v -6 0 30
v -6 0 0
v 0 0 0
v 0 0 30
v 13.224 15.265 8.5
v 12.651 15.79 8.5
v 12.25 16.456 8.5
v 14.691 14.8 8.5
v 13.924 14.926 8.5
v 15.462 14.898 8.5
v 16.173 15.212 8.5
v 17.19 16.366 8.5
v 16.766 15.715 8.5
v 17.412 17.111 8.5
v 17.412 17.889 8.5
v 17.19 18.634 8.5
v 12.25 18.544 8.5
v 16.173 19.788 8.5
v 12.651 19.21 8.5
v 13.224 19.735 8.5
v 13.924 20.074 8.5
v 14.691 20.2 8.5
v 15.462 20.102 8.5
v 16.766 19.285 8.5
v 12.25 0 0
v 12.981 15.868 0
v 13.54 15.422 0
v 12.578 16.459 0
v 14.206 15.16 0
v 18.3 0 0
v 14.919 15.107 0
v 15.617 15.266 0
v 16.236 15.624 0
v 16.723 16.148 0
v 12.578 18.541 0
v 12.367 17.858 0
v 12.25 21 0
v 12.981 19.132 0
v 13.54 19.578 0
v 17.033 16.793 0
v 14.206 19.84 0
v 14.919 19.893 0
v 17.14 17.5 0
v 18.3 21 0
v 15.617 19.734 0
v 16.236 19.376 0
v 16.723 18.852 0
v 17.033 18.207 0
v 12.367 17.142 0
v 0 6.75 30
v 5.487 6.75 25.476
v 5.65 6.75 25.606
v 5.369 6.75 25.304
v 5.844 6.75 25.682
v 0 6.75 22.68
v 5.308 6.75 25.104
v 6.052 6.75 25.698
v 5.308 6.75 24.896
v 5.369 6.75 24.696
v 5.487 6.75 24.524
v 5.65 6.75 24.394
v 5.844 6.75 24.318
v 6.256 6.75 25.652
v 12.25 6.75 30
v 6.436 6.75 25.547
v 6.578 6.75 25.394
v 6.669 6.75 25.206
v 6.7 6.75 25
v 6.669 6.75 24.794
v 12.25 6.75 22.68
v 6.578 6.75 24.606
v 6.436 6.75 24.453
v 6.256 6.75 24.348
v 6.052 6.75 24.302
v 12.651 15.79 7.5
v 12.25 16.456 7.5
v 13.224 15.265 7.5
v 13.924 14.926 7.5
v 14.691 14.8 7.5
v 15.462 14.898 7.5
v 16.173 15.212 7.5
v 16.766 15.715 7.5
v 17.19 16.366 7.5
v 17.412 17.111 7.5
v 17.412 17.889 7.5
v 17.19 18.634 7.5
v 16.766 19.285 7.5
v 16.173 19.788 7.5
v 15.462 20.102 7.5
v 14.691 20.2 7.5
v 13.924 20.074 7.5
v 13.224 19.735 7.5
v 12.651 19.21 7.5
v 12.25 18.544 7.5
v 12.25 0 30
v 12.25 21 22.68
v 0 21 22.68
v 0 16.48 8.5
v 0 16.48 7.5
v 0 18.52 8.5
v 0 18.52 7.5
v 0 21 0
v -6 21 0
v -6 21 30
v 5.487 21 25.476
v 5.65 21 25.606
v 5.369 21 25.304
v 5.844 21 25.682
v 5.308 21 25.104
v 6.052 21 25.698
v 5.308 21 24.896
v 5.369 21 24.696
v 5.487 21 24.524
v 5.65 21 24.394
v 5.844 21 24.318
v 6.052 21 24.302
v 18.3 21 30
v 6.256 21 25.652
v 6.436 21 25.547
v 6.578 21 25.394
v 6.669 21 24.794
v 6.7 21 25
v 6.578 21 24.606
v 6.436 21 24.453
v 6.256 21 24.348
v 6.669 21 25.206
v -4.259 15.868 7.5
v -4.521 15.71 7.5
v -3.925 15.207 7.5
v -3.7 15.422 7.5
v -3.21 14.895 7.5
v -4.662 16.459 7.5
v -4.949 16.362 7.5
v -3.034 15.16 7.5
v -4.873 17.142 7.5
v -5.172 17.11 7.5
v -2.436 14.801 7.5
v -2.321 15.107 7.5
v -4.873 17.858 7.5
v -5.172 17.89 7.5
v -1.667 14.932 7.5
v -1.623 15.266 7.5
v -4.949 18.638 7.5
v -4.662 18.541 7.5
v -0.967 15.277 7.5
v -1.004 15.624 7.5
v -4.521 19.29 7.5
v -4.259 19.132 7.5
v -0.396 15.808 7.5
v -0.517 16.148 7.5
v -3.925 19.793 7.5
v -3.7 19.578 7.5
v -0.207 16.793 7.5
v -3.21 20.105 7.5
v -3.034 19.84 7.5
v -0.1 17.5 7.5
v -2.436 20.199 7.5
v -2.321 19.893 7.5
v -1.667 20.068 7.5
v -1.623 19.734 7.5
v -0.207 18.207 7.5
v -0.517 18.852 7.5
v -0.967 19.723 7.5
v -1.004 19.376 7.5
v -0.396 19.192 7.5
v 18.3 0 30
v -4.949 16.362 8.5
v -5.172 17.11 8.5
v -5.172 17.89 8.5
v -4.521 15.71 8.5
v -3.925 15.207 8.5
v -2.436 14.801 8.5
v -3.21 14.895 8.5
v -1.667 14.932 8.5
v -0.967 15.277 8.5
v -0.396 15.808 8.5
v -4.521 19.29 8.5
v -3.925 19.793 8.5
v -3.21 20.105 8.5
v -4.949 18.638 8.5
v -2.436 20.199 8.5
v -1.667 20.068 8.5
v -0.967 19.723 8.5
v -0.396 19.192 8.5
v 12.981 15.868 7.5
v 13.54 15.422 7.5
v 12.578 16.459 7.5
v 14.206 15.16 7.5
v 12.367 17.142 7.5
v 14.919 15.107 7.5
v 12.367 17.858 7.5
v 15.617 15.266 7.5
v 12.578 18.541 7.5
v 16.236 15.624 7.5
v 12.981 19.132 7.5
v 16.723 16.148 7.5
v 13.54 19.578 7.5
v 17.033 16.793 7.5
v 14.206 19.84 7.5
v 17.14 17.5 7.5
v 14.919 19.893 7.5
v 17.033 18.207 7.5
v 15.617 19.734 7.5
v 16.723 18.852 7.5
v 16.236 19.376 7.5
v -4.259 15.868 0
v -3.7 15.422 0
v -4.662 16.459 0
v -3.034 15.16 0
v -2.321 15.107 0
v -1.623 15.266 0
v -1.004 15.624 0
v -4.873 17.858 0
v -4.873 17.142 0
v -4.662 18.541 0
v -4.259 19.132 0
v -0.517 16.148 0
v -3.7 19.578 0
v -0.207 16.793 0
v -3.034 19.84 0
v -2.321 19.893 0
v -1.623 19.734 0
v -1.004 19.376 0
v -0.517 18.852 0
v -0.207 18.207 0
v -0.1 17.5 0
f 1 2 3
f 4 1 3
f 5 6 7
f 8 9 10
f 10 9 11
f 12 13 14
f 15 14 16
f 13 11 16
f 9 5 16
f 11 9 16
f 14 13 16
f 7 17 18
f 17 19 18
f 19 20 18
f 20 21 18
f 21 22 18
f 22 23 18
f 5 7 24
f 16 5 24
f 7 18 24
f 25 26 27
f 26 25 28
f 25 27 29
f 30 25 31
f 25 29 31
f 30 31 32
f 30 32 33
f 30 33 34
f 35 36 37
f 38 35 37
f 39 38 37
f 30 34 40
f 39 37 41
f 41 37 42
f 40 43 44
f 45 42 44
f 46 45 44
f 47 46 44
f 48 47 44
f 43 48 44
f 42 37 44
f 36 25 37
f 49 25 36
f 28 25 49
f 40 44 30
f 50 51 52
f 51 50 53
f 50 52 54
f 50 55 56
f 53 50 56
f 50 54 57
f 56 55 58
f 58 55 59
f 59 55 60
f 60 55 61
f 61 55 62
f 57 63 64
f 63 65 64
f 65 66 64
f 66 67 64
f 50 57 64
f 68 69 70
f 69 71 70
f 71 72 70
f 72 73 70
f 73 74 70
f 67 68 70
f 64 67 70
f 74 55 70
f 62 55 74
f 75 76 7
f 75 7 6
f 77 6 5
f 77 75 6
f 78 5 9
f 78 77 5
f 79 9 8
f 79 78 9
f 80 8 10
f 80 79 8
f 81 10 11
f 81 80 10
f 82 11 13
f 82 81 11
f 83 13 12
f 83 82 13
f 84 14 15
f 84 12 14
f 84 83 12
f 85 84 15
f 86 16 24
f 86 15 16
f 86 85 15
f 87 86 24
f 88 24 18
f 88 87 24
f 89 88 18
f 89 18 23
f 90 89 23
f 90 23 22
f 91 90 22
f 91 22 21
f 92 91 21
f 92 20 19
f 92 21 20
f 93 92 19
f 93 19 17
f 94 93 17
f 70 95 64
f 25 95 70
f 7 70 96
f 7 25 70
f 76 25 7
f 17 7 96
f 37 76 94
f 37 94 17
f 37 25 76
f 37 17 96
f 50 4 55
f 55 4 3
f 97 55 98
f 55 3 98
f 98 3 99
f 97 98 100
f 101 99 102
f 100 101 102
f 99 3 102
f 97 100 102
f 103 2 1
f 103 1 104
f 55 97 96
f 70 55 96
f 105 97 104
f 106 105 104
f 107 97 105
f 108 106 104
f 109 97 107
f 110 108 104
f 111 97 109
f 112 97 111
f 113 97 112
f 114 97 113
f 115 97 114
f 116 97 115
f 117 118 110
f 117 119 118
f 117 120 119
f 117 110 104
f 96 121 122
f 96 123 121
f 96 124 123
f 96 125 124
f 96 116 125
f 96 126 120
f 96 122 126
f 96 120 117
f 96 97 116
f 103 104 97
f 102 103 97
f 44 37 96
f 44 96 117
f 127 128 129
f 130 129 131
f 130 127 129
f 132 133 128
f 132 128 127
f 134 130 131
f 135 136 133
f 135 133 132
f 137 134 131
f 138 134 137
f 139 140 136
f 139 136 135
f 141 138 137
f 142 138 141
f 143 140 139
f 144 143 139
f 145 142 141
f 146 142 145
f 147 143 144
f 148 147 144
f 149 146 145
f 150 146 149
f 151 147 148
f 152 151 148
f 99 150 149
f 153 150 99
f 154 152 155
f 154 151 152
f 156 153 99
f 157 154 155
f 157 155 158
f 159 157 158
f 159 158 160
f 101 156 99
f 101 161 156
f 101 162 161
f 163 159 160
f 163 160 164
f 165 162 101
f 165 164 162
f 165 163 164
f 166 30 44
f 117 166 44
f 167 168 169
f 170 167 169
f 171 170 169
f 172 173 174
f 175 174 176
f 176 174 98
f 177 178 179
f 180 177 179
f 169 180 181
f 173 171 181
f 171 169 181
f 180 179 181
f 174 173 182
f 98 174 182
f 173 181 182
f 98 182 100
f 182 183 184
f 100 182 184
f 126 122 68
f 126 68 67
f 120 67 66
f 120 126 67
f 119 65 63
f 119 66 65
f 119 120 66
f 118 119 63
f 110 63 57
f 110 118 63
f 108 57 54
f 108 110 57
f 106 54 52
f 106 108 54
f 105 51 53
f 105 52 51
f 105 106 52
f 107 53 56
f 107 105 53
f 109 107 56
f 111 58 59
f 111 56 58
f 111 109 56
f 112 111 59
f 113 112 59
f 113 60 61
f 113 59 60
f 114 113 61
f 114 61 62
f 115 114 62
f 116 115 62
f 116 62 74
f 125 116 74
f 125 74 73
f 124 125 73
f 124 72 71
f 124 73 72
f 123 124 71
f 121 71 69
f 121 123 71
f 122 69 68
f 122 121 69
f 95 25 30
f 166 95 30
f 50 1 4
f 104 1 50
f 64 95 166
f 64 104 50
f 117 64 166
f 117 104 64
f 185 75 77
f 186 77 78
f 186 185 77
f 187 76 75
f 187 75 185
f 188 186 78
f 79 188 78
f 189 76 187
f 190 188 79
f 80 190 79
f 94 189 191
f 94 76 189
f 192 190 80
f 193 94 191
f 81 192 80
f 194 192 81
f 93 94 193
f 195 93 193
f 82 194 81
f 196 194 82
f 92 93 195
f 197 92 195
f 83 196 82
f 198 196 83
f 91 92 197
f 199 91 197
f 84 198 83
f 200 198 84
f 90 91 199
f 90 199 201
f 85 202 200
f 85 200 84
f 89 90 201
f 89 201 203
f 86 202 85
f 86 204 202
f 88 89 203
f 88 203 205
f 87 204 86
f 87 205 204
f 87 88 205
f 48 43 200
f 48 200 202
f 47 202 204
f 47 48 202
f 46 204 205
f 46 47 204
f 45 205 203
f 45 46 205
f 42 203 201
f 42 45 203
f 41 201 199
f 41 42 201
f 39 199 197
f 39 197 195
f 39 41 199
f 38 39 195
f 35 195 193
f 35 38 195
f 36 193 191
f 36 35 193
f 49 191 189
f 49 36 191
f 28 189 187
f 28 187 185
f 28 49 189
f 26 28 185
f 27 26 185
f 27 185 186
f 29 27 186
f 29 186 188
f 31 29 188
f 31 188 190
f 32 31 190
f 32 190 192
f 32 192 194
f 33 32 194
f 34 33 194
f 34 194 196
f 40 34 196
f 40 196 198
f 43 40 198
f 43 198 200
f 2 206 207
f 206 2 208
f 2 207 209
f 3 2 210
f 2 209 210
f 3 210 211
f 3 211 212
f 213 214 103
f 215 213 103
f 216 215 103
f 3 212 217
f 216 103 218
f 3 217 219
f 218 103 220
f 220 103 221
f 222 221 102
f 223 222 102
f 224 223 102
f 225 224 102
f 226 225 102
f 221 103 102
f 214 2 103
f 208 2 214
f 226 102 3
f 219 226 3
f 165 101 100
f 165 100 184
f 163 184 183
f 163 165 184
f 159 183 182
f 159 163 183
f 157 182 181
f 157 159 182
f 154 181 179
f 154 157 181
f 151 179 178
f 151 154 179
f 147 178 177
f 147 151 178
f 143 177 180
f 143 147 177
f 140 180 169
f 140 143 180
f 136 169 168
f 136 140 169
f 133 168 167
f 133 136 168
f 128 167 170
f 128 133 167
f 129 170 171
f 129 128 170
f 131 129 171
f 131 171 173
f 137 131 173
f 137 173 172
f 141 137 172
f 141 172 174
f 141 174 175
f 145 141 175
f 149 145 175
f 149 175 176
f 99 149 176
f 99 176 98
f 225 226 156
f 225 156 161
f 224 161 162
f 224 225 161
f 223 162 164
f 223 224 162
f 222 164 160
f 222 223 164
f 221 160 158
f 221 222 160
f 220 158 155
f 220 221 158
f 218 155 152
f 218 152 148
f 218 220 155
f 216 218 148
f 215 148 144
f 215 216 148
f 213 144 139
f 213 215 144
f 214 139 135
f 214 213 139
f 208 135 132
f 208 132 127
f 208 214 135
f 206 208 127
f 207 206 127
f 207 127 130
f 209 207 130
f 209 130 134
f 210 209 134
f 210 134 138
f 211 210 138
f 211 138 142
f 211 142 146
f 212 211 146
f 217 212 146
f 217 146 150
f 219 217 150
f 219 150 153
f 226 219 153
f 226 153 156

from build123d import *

# Parameters (mm, degrees)
CYLINDER004_R     = 2.4
CYLINDER004_DEPTH = 13
CYLINDER005_R     = 2.7
CYLINDER005_DEPTH = 1
CYLINDER006_R     = 2.7
CYLINDER006_DEPTH = 1
CYLINDER003_R     = 2.4
CYLINDER003_DEPTH = 13
CYLINDER002_R     = 0.7
CYLINDER002_DEPTH = 16
BOX007_W          = 12.25
BOX007_H          = 10
BOX007_DEPTH      = 10
BOX003_W          = 12.25
BOX003_H          = 23.78
BOX003_DEPTH      = 22.68
BOX008_W          = 24.3
BOX008_H          = 21
BOX008_DEPTH      = 30


with BuildPart() as cylinder004:
    # Cylinder004 → Cylinder004 (new body)
    with BuildSketch(Plane(origin=(14.74, 17.5, -6.5), x_dir=(1, 0, 0), z_dir=(0, 0, 1))):
        Circle(CYLINDER004_R)
    extrude(amount=CYLINDER004_DEPTH)


with BuildPart() as cylinder005:
    # Cylinder005 → Cylinder005 (new body)
    with BuildSketch(Plane(origin=(-2.5, 17.5, 6.5), x_dir=(1, 0, 0), z_dir=(0, 0, 1))):
        Circle(CYLINDER005_R)
    extrude(amount=CYLINDER005_DEPTH)


with BuildPart() as cylinder006:
    # Cylinder006 → Cylinder006 (new body)
    with BuildSketch(Plane(origin=(14.74, 17.5, 6.5), x_dir=(1, 0, 0), z_dir=(0, 0, 1))):
        Circle(CYLINDER006_R)
    extrude(amount=CYLINDER006_DEPTH)


with BuildPart() as fusion004:
    # Cylinder003 → Cylinder003 (new body)
    with BuildSketch(Plane(origin=(-2.5, 17.5, -6.5), x_dir=(1, 0, 0), z_dir=(0, 0, 1))):
        Circle(CYLINDER003_R)
    extrude(amount=CYLINDER003_DEPTH)

    # Fusion004: union Cylinder004, Cylinder005, Cylinder006
    add(cylinder004.part)
    add(cylinder005.part)
    add(cylinder006.part)


with BuildPart() as fusion004_1:
    # Fusion004 placement: moved
    add(fusion004.part.moved(Location((0, 0, 1))))


with BuildPart() as cylinder002:
    # Cylinder002 → Cylinder002 (new body)
    with BuildSketch(Plane(origin=(6, 22, 25), x_dir=(1, 0, 0), z_dir=(0, -1, 0))):
        Circle(CYLINDER002_R)
    extrude(amount=CYLINDER002_DEPTH)


with BuildPart() as cube004:
    # Box007 → Box007 (new body)
    with BuildSketch(Plane(origin=(0, -3.25, 22), x_dir=(1, 0, 0), z_dir=(0, 0, 1))):
        with Locations((6.125, 5)):
            Rectangle(BOX007_W, BOX007_H)
    extrude(amount=BOX007_DEPTH)


with BuildPart() as servo002:
    # Box003 → Box003 (new body)
    with BuildSketch(Plane(origin=(0, -1, 0), x_dir=(1, 0, 0), z_dir=(0, 0, 1))):
        with Locations((6.125, 11.89)):
            Rectangle(BOX003_W, BOX003_H)
    extrude(amount=BOX003_DEPTH)

    # Fusion002: union Cube004
    add(cube004.part)


with BuildPart() as fusion003:
    # Fusion003 base: copy of Cube004
    add(cube004.part)

    # Fusion003: union servo002
    add(servo002.part)


with BuildPart() as cut004:
    # Box008 → Box008 (new body)
    with BuildSketch(Plane(origin=(-6, 0, 0), x_dir=(1, 0, 0), z_dir=(0, 0, 1))):
        with Locations((12.15, 10.5)):
            Rectangle(BOX008_W, BOX008_H)
    extrude(amount=BOX008_DEPTH)

    # Cut002: cut Fusion003
    add(fusion003.part, mode=Mode.SUBTRACT)

    # Cut003: cut Cylinder002
    add(cylinder002.part, mode=Mode.SUBTRACT)

    # Cut004: cut Fusion004
    add(fusion004_1.part, mode=Mode.SUBTRACT)


solid = cut004.part
